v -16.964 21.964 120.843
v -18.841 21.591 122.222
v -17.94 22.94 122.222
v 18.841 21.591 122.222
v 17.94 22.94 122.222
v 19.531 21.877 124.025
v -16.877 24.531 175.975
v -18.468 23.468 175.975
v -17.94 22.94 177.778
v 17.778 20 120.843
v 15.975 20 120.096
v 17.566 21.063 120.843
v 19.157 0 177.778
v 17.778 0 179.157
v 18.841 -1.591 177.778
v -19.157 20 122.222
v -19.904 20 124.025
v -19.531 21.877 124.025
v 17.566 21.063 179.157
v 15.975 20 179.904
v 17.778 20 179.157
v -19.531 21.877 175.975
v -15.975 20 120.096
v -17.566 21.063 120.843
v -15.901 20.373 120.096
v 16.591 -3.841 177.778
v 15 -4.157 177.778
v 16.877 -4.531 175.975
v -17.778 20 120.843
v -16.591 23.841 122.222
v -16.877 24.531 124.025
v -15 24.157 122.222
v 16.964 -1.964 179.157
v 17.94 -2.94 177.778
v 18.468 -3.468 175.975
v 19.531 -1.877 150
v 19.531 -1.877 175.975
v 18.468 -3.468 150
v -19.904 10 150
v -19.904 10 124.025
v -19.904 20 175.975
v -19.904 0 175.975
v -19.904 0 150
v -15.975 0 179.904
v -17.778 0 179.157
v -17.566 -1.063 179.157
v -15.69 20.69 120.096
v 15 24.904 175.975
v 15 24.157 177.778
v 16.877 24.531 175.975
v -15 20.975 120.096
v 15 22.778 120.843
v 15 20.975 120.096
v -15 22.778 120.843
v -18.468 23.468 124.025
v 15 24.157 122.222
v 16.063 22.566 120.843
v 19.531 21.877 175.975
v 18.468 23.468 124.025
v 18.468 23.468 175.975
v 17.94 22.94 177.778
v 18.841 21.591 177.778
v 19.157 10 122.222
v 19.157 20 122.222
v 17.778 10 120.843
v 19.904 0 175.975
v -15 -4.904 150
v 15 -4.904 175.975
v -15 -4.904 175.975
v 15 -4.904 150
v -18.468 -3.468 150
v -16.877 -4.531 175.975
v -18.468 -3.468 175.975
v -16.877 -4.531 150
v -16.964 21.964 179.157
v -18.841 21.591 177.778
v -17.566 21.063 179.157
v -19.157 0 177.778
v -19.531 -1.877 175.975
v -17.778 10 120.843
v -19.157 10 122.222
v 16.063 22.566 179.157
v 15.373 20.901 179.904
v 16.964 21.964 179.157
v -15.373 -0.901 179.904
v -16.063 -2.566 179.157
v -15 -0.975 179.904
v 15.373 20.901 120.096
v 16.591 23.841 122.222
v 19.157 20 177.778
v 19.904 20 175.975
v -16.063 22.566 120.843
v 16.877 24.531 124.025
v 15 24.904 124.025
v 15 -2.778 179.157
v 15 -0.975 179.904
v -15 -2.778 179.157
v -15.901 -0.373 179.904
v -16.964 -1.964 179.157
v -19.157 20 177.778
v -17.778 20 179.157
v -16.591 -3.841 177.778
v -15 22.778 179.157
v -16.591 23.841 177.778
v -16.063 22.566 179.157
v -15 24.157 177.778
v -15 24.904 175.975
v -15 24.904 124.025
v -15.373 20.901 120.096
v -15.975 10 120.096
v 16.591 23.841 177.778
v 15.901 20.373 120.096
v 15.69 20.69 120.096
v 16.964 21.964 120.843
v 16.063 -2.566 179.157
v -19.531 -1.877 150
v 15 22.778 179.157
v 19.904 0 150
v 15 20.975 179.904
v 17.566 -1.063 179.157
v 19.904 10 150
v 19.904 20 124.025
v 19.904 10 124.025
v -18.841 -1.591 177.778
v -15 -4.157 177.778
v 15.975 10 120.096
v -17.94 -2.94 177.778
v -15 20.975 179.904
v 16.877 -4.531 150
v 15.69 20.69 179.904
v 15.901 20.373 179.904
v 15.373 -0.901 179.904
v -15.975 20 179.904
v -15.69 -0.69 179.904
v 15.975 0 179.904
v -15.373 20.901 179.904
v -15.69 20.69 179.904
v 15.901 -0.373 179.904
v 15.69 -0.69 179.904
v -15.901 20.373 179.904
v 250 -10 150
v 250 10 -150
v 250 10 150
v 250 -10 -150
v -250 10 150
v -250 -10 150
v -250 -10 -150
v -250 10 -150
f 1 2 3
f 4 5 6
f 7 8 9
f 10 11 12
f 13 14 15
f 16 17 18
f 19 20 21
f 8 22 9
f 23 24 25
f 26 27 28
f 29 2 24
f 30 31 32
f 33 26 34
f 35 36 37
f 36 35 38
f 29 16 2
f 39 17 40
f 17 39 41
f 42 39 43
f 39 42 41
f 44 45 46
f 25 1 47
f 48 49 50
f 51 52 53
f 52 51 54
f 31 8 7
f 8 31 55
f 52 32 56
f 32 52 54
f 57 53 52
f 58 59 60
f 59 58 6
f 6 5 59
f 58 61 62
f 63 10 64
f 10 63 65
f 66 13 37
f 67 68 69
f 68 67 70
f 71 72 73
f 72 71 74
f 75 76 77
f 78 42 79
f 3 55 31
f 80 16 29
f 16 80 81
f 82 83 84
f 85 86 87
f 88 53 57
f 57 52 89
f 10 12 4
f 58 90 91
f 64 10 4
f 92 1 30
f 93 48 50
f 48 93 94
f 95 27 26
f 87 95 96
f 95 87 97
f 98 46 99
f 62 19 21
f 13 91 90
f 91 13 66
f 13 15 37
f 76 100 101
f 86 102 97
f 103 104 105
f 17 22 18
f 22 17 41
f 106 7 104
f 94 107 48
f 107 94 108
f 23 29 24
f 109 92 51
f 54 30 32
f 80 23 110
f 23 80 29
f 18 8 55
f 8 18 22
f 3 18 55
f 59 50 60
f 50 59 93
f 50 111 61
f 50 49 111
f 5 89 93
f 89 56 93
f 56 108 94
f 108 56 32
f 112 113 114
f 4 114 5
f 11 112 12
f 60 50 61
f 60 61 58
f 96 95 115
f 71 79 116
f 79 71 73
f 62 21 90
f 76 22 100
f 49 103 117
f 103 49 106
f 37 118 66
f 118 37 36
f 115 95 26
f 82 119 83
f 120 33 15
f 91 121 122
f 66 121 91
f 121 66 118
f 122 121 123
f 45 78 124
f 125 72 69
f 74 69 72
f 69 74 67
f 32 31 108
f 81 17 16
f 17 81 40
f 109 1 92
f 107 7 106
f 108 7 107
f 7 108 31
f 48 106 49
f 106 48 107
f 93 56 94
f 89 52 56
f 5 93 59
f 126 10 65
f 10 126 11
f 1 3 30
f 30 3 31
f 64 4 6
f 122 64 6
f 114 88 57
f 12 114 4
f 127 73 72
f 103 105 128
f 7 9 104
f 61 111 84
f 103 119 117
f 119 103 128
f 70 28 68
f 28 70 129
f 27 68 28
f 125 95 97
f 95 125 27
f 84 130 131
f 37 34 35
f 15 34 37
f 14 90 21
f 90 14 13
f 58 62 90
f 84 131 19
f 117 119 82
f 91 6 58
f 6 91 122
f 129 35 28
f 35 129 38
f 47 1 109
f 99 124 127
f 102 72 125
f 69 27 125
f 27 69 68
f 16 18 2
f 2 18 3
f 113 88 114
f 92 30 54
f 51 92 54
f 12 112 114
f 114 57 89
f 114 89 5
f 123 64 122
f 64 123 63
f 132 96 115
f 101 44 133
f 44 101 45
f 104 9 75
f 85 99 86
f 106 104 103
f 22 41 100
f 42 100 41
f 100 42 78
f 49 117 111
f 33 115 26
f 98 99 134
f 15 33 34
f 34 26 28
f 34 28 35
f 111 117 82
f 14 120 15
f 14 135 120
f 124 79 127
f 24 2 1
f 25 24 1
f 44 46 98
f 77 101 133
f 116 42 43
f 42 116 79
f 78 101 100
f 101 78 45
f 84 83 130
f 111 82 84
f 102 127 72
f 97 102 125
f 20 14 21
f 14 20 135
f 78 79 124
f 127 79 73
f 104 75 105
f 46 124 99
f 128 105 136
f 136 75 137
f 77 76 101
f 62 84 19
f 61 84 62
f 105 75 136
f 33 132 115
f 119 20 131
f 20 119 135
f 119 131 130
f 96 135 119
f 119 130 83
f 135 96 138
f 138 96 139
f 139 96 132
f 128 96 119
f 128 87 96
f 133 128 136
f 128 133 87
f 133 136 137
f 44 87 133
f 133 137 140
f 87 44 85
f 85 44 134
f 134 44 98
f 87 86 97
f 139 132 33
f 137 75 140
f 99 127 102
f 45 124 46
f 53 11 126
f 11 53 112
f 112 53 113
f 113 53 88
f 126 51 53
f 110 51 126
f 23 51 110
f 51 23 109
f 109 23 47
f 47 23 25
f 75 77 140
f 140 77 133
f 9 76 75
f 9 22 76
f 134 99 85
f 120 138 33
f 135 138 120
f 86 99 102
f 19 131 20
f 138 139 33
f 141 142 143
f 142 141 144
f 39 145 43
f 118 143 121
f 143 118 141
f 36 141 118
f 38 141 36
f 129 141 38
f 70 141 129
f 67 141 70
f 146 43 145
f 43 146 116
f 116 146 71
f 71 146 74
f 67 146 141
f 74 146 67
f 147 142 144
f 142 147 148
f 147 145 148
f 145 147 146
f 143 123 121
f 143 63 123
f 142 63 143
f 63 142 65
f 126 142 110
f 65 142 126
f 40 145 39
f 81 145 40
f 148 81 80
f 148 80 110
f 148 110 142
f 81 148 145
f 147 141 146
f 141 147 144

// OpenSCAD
    monitor_width=500;
    monitor_height=300;
    monitor_depth=20;


module monitor() {
    
    cube([monitor_width, monitor_depth, monitor_height], center=true);
}


module outline () {
    minkowski() {
     sphere(5, center = true);
     
     cube([30,20, 50], center=true);   
        
    }
}


translate([0, monitor_depth/2, monitor_height/2]) {
  outline();
}

monitor();
